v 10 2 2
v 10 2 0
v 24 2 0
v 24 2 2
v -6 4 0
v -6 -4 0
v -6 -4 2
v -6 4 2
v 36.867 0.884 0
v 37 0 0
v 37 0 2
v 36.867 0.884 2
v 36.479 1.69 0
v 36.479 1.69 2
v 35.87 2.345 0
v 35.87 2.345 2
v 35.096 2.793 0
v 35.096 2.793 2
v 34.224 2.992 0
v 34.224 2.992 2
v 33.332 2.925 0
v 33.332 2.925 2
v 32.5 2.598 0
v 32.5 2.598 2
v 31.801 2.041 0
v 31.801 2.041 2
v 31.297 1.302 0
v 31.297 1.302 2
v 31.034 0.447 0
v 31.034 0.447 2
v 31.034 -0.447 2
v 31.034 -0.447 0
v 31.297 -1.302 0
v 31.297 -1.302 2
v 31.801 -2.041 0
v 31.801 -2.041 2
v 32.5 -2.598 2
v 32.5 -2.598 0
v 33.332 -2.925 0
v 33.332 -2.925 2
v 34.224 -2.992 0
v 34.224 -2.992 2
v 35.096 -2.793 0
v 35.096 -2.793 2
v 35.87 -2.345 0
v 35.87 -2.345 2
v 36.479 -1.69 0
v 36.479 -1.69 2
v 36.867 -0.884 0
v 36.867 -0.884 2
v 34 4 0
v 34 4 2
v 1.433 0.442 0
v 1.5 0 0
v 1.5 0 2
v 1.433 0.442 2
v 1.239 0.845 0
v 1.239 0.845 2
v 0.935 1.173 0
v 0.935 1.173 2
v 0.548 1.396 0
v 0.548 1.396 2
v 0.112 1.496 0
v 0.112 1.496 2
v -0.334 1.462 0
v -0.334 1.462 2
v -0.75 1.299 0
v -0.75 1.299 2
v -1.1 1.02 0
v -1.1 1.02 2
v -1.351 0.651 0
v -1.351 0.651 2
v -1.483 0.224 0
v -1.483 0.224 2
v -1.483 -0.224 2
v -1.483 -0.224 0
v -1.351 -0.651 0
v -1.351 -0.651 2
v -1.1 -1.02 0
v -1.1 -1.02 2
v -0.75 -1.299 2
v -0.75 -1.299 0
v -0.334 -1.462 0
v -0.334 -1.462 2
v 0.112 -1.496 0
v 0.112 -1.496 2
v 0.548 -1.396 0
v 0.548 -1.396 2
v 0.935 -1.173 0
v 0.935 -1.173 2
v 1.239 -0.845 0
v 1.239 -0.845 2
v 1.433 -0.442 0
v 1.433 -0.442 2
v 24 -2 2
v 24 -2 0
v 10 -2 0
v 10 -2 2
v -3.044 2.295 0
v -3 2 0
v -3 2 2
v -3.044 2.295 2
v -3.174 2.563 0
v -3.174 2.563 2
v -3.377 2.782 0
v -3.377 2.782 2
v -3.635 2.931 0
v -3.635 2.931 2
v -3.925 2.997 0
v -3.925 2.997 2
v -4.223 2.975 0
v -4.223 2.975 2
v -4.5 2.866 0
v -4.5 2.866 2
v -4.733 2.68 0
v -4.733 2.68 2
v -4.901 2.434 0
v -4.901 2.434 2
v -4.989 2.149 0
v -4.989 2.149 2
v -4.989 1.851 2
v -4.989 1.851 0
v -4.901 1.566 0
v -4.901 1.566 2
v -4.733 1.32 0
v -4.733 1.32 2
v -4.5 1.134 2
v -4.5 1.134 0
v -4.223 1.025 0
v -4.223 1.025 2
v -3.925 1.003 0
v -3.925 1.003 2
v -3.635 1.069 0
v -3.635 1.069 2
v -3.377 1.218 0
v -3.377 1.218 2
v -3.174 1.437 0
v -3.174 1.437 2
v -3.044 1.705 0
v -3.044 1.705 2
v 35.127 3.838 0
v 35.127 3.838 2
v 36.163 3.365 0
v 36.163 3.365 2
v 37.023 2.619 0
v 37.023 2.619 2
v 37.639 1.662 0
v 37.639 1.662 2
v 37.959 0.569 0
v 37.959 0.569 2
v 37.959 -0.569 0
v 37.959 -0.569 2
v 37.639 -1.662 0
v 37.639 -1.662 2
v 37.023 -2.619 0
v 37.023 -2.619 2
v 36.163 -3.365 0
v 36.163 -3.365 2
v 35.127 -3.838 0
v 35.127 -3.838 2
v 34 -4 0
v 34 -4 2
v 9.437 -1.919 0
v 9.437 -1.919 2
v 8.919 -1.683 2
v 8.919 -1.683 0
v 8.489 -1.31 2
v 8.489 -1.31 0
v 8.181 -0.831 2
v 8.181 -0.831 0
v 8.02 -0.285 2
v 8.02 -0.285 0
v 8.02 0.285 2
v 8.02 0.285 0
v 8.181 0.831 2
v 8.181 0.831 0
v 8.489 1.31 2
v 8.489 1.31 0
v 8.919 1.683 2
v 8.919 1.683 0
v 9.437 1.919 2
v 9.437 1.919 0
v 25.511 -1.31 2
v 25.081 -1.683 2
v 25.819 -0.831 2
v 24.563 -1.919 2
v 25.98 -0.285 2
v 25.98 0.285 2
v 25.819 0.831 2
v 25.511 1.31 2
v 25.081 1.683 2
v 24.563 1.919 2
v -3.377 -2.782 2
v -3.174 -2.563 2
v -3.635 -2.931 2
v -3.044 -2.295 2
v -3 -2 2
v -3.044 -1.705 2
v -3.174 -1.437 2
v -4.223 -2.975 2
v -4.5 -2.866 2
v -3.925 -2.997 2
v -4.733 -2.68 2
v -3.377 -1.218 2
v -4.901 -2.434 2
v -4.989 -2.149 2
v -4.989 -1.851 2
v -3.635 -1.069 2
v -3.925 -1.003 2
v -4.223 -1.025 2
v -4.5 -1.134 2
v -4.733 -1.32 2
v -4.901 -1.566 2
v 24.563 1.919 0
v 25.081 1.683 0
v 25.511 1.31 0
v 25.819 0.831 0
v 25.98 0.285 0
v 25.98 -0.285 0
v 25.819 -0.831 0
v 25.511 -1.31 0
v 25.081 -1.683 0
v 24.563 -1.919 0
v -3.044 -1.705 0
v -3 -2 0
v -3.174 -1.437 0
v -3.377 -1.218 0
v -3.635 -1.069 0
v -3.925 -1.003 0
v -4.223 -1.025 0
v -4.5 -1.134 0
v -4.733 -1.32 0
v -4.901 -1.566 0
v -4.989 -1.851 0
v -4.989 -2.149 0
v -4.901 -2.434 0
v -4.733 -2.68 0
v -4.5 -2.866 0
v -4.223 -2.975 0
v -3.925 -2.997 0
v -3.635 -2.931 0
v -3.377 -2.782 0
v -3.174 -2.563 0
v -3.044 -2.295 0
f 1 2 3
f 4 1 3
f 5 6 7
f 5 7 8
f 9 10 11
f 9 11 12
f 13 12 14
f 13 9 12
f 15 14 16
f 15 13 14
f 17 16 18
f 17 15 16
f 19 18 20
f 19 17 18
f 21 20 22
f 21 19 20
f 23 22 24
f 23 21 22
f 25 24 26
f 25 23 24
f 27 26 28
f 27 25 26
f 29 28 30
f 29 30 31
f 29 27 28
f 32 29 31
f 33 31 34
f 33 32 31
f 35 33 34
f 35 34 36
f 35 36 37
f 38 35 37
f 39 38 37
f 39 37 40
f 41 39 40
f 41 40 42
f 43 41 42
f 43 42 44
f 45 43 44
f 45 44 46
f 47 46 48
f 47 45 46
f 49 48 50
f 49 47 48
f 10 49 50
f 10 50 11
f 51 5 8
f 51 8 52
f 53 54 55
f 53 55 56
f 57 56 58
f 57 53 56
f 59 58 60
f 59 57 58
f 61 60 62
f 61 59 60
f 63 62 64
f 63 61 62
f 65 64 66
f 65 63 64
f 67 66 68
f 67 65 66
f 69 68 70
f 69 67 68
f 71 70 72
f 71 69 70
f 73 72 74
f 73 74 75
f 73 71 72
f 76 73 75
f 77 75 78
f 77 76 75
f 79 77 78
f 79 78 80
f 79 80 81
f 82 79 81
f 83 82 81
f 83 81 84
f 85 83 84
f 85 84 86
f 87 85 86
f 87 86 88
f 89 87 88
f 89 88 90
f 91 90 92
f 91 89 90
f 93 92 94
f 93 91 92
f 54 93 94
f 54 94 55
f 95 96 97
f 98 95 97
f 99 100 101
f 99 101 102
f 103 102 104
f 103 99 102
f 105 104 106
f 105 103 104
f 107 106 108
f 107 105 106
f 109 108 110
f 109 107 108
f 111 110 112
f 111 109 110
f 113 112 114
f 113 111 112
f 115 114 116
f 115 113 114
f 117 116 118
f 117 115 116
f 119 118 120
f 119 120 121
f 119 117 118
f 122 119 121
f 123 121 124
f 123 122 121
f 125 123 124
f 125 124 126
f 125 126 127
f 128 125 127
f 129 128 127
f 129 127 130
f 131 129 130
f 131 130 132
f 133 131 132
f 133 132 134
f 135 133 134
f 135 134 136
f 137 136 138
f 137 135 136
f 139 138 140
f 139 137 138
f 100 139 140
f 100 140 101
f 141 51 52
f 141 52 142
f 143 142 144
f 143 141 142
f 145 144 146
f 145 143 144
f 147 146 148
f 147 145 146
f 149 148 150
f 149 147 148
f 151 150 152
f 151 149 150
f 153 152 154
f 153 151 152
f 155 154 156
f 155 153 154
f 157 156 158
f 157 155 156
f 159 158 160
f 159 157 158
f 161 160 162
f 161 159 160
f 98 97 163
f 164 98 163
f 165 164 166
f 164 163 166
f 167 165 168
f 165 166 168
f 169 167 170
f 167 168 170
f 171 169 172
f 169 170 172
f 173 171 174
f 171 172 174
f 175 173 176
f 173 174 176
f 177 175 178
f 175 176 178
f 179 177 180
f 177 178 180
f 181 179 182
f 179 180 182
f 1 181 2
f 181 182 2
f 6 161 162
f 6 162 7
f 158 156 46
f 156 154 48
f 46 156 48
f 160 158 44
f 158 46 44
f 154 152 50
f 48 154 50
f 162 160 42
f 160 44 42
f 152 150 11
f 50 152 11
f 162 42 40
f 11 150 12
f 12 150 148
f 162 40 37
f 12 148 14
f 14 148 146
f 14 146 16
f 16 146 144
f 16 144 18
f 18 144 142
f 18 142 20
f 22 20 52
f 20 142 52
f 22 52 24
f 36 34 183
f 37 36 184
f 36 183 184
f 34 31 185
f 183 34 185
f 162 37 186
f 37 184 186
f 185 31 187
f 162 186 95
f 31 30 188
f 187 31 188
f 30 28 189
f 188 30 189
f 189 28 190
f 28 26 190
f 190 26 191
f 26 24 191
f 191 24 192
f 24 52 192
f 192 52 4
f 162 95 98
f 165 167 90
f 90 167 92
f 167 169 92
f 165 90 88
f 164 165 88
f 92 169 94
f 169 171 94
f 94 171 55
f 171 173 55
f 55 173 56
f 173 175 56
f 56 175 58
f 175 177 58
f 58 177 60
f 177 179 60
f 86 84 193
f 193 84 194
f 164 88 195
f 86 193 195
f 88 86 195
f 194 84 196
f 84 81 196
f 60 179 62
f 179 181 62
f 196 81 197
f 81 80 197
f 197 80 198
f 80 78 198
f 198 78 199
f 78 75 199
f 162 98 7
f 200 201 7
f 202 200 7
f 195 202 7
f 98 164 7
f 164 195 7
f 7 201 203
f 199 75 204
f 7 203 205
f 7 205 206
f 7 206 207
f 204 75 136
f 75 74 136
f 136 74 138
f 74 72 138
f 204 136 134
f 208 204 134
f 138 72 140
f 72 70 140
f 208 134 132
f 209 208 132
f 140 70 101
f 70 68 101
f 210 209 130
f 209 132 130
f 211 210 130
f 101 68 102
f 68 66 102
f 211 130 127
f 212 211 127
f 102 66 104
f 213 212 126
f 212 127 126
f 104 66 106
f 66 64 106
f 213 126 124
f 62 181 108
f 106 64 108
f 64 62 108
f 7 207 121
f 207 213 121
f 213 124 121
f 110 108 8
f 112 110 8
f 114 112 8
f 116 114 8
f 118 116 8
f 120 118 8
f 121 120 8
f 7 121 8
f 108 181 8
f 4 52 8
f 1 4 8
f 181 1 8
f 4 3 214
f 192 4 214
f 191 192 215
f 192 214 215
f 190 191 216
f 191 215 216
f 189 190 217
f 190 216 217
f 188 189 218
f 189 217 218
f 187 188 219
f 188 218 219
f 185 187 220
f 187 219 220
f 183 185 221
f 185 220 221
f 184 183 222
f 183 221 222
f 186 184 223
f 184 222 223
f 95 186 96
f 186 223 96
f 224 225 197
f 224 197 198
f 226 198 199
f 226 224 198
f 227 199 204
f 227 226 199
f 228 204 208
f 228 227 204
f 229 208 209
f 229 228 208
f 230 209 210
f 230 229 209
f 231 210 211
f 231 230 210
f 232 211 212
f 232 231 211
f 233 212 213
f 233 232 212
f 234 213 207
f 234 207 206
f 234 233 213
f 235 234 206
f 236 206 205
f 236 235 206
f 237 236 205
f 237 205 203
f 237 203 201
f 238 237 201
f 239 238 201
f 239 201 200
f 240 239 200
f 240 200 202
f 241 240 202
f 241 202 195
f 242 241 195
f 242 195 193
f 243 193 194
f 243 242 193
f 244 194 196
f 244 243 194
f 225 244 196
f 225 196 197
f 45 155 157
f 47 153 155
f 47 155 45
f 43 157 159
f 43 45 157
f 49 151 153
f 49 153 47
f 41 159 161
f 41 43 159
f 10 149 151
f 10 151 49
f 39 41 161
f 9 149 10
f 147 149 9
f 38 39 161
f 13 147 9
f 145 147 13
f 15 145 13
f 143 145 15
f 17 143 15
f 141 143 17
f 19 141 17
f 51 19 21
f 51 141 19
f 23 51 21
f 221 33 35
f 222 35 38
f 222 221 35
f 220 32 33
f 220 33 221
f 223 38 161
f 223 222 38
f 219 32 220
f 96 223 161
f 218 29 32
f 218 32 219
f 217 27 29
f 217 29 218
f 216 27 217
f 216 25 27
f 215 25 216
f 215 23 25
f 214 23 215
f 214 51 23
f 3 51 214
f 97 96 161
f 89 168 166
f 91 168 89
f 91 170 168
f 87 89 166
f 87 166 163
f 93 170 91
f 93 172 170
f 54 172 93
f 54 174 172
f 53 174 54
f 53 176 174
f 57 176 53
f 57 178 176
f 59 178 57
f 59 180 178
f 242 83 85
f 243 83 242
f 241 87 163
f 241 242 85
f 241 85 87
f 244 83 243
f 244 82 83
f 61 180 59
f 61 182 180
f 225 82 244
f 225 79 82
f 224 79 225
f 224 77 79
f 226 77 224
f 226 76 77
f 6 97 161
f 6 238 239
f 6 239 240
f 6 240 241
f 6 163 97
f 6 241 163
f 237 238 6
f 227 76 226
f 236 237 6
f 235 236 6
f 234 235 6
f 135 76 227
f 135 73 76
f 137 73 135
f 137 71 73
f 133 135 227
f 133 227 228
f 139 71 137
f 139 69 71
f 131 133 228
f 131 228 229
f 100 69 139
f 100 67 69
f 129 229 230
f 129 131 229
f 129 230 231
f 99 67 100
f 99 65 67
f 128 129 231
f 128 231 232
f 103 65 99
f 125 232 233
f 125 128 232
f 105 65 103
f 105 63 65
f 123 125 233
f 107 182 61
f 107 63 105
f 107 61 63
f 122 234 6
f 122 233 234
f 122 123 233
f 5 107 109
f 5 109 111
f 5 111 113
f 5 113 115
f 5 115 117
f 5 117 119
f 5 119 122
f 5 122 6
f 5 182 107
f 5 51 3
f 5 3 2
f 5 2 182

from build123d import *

# Parameters (mm, degrees)
SKETCH_2_R      = 1
SKETCH_2_R_2    = 1.5
SKETCH_2_R_3    = 3
EXTRUDE_1_DEPTH = 2


with BuildPart() as part:
    # 草图2 → 凸台-拉伸1 (new body)
    with BuildSketch(Plane.XY):
        with BuildLine():
            Line((0, 4), (34, 4))
            ThreePointArc((34, 4), (38, 0), (34, -4))
            Line((34, -4), (0, -4))
            Line((0, -4), (-6, -4))
            Line((-6, -4), (-6, 4))
            Line((-6, 4), (0, 4))
        make_face()
        with Locations((-4, 2)):
            Circle(SKETCH_2_R, mode=Mode.SUBTRACT)
        Circle(SKETCH_2_R_2, mode=Mode.SUBTRACT)
        with Locations((34, 0)):
            Circle(SKETCH_2_R_3, mode=Mode.SUBTRACT)
        with Locations((-4, -2)):
            Circle(SKETCH_2_R, mode=Mode.SUBTRACT)
        with BuildLine():
            Line((10, 2), (24, 2))
            ThreePointArc((24, 2), (26, 0), (24, -2))
            Line((24, -2), (10, -2))
            ThreePointArc((10, -2), (8, 0), (10, 2))
        make_face(mode=Mode.SUBTRACT)
    extrude(amount=EXTRUDE_1_DEPTH)


solid = part.part
